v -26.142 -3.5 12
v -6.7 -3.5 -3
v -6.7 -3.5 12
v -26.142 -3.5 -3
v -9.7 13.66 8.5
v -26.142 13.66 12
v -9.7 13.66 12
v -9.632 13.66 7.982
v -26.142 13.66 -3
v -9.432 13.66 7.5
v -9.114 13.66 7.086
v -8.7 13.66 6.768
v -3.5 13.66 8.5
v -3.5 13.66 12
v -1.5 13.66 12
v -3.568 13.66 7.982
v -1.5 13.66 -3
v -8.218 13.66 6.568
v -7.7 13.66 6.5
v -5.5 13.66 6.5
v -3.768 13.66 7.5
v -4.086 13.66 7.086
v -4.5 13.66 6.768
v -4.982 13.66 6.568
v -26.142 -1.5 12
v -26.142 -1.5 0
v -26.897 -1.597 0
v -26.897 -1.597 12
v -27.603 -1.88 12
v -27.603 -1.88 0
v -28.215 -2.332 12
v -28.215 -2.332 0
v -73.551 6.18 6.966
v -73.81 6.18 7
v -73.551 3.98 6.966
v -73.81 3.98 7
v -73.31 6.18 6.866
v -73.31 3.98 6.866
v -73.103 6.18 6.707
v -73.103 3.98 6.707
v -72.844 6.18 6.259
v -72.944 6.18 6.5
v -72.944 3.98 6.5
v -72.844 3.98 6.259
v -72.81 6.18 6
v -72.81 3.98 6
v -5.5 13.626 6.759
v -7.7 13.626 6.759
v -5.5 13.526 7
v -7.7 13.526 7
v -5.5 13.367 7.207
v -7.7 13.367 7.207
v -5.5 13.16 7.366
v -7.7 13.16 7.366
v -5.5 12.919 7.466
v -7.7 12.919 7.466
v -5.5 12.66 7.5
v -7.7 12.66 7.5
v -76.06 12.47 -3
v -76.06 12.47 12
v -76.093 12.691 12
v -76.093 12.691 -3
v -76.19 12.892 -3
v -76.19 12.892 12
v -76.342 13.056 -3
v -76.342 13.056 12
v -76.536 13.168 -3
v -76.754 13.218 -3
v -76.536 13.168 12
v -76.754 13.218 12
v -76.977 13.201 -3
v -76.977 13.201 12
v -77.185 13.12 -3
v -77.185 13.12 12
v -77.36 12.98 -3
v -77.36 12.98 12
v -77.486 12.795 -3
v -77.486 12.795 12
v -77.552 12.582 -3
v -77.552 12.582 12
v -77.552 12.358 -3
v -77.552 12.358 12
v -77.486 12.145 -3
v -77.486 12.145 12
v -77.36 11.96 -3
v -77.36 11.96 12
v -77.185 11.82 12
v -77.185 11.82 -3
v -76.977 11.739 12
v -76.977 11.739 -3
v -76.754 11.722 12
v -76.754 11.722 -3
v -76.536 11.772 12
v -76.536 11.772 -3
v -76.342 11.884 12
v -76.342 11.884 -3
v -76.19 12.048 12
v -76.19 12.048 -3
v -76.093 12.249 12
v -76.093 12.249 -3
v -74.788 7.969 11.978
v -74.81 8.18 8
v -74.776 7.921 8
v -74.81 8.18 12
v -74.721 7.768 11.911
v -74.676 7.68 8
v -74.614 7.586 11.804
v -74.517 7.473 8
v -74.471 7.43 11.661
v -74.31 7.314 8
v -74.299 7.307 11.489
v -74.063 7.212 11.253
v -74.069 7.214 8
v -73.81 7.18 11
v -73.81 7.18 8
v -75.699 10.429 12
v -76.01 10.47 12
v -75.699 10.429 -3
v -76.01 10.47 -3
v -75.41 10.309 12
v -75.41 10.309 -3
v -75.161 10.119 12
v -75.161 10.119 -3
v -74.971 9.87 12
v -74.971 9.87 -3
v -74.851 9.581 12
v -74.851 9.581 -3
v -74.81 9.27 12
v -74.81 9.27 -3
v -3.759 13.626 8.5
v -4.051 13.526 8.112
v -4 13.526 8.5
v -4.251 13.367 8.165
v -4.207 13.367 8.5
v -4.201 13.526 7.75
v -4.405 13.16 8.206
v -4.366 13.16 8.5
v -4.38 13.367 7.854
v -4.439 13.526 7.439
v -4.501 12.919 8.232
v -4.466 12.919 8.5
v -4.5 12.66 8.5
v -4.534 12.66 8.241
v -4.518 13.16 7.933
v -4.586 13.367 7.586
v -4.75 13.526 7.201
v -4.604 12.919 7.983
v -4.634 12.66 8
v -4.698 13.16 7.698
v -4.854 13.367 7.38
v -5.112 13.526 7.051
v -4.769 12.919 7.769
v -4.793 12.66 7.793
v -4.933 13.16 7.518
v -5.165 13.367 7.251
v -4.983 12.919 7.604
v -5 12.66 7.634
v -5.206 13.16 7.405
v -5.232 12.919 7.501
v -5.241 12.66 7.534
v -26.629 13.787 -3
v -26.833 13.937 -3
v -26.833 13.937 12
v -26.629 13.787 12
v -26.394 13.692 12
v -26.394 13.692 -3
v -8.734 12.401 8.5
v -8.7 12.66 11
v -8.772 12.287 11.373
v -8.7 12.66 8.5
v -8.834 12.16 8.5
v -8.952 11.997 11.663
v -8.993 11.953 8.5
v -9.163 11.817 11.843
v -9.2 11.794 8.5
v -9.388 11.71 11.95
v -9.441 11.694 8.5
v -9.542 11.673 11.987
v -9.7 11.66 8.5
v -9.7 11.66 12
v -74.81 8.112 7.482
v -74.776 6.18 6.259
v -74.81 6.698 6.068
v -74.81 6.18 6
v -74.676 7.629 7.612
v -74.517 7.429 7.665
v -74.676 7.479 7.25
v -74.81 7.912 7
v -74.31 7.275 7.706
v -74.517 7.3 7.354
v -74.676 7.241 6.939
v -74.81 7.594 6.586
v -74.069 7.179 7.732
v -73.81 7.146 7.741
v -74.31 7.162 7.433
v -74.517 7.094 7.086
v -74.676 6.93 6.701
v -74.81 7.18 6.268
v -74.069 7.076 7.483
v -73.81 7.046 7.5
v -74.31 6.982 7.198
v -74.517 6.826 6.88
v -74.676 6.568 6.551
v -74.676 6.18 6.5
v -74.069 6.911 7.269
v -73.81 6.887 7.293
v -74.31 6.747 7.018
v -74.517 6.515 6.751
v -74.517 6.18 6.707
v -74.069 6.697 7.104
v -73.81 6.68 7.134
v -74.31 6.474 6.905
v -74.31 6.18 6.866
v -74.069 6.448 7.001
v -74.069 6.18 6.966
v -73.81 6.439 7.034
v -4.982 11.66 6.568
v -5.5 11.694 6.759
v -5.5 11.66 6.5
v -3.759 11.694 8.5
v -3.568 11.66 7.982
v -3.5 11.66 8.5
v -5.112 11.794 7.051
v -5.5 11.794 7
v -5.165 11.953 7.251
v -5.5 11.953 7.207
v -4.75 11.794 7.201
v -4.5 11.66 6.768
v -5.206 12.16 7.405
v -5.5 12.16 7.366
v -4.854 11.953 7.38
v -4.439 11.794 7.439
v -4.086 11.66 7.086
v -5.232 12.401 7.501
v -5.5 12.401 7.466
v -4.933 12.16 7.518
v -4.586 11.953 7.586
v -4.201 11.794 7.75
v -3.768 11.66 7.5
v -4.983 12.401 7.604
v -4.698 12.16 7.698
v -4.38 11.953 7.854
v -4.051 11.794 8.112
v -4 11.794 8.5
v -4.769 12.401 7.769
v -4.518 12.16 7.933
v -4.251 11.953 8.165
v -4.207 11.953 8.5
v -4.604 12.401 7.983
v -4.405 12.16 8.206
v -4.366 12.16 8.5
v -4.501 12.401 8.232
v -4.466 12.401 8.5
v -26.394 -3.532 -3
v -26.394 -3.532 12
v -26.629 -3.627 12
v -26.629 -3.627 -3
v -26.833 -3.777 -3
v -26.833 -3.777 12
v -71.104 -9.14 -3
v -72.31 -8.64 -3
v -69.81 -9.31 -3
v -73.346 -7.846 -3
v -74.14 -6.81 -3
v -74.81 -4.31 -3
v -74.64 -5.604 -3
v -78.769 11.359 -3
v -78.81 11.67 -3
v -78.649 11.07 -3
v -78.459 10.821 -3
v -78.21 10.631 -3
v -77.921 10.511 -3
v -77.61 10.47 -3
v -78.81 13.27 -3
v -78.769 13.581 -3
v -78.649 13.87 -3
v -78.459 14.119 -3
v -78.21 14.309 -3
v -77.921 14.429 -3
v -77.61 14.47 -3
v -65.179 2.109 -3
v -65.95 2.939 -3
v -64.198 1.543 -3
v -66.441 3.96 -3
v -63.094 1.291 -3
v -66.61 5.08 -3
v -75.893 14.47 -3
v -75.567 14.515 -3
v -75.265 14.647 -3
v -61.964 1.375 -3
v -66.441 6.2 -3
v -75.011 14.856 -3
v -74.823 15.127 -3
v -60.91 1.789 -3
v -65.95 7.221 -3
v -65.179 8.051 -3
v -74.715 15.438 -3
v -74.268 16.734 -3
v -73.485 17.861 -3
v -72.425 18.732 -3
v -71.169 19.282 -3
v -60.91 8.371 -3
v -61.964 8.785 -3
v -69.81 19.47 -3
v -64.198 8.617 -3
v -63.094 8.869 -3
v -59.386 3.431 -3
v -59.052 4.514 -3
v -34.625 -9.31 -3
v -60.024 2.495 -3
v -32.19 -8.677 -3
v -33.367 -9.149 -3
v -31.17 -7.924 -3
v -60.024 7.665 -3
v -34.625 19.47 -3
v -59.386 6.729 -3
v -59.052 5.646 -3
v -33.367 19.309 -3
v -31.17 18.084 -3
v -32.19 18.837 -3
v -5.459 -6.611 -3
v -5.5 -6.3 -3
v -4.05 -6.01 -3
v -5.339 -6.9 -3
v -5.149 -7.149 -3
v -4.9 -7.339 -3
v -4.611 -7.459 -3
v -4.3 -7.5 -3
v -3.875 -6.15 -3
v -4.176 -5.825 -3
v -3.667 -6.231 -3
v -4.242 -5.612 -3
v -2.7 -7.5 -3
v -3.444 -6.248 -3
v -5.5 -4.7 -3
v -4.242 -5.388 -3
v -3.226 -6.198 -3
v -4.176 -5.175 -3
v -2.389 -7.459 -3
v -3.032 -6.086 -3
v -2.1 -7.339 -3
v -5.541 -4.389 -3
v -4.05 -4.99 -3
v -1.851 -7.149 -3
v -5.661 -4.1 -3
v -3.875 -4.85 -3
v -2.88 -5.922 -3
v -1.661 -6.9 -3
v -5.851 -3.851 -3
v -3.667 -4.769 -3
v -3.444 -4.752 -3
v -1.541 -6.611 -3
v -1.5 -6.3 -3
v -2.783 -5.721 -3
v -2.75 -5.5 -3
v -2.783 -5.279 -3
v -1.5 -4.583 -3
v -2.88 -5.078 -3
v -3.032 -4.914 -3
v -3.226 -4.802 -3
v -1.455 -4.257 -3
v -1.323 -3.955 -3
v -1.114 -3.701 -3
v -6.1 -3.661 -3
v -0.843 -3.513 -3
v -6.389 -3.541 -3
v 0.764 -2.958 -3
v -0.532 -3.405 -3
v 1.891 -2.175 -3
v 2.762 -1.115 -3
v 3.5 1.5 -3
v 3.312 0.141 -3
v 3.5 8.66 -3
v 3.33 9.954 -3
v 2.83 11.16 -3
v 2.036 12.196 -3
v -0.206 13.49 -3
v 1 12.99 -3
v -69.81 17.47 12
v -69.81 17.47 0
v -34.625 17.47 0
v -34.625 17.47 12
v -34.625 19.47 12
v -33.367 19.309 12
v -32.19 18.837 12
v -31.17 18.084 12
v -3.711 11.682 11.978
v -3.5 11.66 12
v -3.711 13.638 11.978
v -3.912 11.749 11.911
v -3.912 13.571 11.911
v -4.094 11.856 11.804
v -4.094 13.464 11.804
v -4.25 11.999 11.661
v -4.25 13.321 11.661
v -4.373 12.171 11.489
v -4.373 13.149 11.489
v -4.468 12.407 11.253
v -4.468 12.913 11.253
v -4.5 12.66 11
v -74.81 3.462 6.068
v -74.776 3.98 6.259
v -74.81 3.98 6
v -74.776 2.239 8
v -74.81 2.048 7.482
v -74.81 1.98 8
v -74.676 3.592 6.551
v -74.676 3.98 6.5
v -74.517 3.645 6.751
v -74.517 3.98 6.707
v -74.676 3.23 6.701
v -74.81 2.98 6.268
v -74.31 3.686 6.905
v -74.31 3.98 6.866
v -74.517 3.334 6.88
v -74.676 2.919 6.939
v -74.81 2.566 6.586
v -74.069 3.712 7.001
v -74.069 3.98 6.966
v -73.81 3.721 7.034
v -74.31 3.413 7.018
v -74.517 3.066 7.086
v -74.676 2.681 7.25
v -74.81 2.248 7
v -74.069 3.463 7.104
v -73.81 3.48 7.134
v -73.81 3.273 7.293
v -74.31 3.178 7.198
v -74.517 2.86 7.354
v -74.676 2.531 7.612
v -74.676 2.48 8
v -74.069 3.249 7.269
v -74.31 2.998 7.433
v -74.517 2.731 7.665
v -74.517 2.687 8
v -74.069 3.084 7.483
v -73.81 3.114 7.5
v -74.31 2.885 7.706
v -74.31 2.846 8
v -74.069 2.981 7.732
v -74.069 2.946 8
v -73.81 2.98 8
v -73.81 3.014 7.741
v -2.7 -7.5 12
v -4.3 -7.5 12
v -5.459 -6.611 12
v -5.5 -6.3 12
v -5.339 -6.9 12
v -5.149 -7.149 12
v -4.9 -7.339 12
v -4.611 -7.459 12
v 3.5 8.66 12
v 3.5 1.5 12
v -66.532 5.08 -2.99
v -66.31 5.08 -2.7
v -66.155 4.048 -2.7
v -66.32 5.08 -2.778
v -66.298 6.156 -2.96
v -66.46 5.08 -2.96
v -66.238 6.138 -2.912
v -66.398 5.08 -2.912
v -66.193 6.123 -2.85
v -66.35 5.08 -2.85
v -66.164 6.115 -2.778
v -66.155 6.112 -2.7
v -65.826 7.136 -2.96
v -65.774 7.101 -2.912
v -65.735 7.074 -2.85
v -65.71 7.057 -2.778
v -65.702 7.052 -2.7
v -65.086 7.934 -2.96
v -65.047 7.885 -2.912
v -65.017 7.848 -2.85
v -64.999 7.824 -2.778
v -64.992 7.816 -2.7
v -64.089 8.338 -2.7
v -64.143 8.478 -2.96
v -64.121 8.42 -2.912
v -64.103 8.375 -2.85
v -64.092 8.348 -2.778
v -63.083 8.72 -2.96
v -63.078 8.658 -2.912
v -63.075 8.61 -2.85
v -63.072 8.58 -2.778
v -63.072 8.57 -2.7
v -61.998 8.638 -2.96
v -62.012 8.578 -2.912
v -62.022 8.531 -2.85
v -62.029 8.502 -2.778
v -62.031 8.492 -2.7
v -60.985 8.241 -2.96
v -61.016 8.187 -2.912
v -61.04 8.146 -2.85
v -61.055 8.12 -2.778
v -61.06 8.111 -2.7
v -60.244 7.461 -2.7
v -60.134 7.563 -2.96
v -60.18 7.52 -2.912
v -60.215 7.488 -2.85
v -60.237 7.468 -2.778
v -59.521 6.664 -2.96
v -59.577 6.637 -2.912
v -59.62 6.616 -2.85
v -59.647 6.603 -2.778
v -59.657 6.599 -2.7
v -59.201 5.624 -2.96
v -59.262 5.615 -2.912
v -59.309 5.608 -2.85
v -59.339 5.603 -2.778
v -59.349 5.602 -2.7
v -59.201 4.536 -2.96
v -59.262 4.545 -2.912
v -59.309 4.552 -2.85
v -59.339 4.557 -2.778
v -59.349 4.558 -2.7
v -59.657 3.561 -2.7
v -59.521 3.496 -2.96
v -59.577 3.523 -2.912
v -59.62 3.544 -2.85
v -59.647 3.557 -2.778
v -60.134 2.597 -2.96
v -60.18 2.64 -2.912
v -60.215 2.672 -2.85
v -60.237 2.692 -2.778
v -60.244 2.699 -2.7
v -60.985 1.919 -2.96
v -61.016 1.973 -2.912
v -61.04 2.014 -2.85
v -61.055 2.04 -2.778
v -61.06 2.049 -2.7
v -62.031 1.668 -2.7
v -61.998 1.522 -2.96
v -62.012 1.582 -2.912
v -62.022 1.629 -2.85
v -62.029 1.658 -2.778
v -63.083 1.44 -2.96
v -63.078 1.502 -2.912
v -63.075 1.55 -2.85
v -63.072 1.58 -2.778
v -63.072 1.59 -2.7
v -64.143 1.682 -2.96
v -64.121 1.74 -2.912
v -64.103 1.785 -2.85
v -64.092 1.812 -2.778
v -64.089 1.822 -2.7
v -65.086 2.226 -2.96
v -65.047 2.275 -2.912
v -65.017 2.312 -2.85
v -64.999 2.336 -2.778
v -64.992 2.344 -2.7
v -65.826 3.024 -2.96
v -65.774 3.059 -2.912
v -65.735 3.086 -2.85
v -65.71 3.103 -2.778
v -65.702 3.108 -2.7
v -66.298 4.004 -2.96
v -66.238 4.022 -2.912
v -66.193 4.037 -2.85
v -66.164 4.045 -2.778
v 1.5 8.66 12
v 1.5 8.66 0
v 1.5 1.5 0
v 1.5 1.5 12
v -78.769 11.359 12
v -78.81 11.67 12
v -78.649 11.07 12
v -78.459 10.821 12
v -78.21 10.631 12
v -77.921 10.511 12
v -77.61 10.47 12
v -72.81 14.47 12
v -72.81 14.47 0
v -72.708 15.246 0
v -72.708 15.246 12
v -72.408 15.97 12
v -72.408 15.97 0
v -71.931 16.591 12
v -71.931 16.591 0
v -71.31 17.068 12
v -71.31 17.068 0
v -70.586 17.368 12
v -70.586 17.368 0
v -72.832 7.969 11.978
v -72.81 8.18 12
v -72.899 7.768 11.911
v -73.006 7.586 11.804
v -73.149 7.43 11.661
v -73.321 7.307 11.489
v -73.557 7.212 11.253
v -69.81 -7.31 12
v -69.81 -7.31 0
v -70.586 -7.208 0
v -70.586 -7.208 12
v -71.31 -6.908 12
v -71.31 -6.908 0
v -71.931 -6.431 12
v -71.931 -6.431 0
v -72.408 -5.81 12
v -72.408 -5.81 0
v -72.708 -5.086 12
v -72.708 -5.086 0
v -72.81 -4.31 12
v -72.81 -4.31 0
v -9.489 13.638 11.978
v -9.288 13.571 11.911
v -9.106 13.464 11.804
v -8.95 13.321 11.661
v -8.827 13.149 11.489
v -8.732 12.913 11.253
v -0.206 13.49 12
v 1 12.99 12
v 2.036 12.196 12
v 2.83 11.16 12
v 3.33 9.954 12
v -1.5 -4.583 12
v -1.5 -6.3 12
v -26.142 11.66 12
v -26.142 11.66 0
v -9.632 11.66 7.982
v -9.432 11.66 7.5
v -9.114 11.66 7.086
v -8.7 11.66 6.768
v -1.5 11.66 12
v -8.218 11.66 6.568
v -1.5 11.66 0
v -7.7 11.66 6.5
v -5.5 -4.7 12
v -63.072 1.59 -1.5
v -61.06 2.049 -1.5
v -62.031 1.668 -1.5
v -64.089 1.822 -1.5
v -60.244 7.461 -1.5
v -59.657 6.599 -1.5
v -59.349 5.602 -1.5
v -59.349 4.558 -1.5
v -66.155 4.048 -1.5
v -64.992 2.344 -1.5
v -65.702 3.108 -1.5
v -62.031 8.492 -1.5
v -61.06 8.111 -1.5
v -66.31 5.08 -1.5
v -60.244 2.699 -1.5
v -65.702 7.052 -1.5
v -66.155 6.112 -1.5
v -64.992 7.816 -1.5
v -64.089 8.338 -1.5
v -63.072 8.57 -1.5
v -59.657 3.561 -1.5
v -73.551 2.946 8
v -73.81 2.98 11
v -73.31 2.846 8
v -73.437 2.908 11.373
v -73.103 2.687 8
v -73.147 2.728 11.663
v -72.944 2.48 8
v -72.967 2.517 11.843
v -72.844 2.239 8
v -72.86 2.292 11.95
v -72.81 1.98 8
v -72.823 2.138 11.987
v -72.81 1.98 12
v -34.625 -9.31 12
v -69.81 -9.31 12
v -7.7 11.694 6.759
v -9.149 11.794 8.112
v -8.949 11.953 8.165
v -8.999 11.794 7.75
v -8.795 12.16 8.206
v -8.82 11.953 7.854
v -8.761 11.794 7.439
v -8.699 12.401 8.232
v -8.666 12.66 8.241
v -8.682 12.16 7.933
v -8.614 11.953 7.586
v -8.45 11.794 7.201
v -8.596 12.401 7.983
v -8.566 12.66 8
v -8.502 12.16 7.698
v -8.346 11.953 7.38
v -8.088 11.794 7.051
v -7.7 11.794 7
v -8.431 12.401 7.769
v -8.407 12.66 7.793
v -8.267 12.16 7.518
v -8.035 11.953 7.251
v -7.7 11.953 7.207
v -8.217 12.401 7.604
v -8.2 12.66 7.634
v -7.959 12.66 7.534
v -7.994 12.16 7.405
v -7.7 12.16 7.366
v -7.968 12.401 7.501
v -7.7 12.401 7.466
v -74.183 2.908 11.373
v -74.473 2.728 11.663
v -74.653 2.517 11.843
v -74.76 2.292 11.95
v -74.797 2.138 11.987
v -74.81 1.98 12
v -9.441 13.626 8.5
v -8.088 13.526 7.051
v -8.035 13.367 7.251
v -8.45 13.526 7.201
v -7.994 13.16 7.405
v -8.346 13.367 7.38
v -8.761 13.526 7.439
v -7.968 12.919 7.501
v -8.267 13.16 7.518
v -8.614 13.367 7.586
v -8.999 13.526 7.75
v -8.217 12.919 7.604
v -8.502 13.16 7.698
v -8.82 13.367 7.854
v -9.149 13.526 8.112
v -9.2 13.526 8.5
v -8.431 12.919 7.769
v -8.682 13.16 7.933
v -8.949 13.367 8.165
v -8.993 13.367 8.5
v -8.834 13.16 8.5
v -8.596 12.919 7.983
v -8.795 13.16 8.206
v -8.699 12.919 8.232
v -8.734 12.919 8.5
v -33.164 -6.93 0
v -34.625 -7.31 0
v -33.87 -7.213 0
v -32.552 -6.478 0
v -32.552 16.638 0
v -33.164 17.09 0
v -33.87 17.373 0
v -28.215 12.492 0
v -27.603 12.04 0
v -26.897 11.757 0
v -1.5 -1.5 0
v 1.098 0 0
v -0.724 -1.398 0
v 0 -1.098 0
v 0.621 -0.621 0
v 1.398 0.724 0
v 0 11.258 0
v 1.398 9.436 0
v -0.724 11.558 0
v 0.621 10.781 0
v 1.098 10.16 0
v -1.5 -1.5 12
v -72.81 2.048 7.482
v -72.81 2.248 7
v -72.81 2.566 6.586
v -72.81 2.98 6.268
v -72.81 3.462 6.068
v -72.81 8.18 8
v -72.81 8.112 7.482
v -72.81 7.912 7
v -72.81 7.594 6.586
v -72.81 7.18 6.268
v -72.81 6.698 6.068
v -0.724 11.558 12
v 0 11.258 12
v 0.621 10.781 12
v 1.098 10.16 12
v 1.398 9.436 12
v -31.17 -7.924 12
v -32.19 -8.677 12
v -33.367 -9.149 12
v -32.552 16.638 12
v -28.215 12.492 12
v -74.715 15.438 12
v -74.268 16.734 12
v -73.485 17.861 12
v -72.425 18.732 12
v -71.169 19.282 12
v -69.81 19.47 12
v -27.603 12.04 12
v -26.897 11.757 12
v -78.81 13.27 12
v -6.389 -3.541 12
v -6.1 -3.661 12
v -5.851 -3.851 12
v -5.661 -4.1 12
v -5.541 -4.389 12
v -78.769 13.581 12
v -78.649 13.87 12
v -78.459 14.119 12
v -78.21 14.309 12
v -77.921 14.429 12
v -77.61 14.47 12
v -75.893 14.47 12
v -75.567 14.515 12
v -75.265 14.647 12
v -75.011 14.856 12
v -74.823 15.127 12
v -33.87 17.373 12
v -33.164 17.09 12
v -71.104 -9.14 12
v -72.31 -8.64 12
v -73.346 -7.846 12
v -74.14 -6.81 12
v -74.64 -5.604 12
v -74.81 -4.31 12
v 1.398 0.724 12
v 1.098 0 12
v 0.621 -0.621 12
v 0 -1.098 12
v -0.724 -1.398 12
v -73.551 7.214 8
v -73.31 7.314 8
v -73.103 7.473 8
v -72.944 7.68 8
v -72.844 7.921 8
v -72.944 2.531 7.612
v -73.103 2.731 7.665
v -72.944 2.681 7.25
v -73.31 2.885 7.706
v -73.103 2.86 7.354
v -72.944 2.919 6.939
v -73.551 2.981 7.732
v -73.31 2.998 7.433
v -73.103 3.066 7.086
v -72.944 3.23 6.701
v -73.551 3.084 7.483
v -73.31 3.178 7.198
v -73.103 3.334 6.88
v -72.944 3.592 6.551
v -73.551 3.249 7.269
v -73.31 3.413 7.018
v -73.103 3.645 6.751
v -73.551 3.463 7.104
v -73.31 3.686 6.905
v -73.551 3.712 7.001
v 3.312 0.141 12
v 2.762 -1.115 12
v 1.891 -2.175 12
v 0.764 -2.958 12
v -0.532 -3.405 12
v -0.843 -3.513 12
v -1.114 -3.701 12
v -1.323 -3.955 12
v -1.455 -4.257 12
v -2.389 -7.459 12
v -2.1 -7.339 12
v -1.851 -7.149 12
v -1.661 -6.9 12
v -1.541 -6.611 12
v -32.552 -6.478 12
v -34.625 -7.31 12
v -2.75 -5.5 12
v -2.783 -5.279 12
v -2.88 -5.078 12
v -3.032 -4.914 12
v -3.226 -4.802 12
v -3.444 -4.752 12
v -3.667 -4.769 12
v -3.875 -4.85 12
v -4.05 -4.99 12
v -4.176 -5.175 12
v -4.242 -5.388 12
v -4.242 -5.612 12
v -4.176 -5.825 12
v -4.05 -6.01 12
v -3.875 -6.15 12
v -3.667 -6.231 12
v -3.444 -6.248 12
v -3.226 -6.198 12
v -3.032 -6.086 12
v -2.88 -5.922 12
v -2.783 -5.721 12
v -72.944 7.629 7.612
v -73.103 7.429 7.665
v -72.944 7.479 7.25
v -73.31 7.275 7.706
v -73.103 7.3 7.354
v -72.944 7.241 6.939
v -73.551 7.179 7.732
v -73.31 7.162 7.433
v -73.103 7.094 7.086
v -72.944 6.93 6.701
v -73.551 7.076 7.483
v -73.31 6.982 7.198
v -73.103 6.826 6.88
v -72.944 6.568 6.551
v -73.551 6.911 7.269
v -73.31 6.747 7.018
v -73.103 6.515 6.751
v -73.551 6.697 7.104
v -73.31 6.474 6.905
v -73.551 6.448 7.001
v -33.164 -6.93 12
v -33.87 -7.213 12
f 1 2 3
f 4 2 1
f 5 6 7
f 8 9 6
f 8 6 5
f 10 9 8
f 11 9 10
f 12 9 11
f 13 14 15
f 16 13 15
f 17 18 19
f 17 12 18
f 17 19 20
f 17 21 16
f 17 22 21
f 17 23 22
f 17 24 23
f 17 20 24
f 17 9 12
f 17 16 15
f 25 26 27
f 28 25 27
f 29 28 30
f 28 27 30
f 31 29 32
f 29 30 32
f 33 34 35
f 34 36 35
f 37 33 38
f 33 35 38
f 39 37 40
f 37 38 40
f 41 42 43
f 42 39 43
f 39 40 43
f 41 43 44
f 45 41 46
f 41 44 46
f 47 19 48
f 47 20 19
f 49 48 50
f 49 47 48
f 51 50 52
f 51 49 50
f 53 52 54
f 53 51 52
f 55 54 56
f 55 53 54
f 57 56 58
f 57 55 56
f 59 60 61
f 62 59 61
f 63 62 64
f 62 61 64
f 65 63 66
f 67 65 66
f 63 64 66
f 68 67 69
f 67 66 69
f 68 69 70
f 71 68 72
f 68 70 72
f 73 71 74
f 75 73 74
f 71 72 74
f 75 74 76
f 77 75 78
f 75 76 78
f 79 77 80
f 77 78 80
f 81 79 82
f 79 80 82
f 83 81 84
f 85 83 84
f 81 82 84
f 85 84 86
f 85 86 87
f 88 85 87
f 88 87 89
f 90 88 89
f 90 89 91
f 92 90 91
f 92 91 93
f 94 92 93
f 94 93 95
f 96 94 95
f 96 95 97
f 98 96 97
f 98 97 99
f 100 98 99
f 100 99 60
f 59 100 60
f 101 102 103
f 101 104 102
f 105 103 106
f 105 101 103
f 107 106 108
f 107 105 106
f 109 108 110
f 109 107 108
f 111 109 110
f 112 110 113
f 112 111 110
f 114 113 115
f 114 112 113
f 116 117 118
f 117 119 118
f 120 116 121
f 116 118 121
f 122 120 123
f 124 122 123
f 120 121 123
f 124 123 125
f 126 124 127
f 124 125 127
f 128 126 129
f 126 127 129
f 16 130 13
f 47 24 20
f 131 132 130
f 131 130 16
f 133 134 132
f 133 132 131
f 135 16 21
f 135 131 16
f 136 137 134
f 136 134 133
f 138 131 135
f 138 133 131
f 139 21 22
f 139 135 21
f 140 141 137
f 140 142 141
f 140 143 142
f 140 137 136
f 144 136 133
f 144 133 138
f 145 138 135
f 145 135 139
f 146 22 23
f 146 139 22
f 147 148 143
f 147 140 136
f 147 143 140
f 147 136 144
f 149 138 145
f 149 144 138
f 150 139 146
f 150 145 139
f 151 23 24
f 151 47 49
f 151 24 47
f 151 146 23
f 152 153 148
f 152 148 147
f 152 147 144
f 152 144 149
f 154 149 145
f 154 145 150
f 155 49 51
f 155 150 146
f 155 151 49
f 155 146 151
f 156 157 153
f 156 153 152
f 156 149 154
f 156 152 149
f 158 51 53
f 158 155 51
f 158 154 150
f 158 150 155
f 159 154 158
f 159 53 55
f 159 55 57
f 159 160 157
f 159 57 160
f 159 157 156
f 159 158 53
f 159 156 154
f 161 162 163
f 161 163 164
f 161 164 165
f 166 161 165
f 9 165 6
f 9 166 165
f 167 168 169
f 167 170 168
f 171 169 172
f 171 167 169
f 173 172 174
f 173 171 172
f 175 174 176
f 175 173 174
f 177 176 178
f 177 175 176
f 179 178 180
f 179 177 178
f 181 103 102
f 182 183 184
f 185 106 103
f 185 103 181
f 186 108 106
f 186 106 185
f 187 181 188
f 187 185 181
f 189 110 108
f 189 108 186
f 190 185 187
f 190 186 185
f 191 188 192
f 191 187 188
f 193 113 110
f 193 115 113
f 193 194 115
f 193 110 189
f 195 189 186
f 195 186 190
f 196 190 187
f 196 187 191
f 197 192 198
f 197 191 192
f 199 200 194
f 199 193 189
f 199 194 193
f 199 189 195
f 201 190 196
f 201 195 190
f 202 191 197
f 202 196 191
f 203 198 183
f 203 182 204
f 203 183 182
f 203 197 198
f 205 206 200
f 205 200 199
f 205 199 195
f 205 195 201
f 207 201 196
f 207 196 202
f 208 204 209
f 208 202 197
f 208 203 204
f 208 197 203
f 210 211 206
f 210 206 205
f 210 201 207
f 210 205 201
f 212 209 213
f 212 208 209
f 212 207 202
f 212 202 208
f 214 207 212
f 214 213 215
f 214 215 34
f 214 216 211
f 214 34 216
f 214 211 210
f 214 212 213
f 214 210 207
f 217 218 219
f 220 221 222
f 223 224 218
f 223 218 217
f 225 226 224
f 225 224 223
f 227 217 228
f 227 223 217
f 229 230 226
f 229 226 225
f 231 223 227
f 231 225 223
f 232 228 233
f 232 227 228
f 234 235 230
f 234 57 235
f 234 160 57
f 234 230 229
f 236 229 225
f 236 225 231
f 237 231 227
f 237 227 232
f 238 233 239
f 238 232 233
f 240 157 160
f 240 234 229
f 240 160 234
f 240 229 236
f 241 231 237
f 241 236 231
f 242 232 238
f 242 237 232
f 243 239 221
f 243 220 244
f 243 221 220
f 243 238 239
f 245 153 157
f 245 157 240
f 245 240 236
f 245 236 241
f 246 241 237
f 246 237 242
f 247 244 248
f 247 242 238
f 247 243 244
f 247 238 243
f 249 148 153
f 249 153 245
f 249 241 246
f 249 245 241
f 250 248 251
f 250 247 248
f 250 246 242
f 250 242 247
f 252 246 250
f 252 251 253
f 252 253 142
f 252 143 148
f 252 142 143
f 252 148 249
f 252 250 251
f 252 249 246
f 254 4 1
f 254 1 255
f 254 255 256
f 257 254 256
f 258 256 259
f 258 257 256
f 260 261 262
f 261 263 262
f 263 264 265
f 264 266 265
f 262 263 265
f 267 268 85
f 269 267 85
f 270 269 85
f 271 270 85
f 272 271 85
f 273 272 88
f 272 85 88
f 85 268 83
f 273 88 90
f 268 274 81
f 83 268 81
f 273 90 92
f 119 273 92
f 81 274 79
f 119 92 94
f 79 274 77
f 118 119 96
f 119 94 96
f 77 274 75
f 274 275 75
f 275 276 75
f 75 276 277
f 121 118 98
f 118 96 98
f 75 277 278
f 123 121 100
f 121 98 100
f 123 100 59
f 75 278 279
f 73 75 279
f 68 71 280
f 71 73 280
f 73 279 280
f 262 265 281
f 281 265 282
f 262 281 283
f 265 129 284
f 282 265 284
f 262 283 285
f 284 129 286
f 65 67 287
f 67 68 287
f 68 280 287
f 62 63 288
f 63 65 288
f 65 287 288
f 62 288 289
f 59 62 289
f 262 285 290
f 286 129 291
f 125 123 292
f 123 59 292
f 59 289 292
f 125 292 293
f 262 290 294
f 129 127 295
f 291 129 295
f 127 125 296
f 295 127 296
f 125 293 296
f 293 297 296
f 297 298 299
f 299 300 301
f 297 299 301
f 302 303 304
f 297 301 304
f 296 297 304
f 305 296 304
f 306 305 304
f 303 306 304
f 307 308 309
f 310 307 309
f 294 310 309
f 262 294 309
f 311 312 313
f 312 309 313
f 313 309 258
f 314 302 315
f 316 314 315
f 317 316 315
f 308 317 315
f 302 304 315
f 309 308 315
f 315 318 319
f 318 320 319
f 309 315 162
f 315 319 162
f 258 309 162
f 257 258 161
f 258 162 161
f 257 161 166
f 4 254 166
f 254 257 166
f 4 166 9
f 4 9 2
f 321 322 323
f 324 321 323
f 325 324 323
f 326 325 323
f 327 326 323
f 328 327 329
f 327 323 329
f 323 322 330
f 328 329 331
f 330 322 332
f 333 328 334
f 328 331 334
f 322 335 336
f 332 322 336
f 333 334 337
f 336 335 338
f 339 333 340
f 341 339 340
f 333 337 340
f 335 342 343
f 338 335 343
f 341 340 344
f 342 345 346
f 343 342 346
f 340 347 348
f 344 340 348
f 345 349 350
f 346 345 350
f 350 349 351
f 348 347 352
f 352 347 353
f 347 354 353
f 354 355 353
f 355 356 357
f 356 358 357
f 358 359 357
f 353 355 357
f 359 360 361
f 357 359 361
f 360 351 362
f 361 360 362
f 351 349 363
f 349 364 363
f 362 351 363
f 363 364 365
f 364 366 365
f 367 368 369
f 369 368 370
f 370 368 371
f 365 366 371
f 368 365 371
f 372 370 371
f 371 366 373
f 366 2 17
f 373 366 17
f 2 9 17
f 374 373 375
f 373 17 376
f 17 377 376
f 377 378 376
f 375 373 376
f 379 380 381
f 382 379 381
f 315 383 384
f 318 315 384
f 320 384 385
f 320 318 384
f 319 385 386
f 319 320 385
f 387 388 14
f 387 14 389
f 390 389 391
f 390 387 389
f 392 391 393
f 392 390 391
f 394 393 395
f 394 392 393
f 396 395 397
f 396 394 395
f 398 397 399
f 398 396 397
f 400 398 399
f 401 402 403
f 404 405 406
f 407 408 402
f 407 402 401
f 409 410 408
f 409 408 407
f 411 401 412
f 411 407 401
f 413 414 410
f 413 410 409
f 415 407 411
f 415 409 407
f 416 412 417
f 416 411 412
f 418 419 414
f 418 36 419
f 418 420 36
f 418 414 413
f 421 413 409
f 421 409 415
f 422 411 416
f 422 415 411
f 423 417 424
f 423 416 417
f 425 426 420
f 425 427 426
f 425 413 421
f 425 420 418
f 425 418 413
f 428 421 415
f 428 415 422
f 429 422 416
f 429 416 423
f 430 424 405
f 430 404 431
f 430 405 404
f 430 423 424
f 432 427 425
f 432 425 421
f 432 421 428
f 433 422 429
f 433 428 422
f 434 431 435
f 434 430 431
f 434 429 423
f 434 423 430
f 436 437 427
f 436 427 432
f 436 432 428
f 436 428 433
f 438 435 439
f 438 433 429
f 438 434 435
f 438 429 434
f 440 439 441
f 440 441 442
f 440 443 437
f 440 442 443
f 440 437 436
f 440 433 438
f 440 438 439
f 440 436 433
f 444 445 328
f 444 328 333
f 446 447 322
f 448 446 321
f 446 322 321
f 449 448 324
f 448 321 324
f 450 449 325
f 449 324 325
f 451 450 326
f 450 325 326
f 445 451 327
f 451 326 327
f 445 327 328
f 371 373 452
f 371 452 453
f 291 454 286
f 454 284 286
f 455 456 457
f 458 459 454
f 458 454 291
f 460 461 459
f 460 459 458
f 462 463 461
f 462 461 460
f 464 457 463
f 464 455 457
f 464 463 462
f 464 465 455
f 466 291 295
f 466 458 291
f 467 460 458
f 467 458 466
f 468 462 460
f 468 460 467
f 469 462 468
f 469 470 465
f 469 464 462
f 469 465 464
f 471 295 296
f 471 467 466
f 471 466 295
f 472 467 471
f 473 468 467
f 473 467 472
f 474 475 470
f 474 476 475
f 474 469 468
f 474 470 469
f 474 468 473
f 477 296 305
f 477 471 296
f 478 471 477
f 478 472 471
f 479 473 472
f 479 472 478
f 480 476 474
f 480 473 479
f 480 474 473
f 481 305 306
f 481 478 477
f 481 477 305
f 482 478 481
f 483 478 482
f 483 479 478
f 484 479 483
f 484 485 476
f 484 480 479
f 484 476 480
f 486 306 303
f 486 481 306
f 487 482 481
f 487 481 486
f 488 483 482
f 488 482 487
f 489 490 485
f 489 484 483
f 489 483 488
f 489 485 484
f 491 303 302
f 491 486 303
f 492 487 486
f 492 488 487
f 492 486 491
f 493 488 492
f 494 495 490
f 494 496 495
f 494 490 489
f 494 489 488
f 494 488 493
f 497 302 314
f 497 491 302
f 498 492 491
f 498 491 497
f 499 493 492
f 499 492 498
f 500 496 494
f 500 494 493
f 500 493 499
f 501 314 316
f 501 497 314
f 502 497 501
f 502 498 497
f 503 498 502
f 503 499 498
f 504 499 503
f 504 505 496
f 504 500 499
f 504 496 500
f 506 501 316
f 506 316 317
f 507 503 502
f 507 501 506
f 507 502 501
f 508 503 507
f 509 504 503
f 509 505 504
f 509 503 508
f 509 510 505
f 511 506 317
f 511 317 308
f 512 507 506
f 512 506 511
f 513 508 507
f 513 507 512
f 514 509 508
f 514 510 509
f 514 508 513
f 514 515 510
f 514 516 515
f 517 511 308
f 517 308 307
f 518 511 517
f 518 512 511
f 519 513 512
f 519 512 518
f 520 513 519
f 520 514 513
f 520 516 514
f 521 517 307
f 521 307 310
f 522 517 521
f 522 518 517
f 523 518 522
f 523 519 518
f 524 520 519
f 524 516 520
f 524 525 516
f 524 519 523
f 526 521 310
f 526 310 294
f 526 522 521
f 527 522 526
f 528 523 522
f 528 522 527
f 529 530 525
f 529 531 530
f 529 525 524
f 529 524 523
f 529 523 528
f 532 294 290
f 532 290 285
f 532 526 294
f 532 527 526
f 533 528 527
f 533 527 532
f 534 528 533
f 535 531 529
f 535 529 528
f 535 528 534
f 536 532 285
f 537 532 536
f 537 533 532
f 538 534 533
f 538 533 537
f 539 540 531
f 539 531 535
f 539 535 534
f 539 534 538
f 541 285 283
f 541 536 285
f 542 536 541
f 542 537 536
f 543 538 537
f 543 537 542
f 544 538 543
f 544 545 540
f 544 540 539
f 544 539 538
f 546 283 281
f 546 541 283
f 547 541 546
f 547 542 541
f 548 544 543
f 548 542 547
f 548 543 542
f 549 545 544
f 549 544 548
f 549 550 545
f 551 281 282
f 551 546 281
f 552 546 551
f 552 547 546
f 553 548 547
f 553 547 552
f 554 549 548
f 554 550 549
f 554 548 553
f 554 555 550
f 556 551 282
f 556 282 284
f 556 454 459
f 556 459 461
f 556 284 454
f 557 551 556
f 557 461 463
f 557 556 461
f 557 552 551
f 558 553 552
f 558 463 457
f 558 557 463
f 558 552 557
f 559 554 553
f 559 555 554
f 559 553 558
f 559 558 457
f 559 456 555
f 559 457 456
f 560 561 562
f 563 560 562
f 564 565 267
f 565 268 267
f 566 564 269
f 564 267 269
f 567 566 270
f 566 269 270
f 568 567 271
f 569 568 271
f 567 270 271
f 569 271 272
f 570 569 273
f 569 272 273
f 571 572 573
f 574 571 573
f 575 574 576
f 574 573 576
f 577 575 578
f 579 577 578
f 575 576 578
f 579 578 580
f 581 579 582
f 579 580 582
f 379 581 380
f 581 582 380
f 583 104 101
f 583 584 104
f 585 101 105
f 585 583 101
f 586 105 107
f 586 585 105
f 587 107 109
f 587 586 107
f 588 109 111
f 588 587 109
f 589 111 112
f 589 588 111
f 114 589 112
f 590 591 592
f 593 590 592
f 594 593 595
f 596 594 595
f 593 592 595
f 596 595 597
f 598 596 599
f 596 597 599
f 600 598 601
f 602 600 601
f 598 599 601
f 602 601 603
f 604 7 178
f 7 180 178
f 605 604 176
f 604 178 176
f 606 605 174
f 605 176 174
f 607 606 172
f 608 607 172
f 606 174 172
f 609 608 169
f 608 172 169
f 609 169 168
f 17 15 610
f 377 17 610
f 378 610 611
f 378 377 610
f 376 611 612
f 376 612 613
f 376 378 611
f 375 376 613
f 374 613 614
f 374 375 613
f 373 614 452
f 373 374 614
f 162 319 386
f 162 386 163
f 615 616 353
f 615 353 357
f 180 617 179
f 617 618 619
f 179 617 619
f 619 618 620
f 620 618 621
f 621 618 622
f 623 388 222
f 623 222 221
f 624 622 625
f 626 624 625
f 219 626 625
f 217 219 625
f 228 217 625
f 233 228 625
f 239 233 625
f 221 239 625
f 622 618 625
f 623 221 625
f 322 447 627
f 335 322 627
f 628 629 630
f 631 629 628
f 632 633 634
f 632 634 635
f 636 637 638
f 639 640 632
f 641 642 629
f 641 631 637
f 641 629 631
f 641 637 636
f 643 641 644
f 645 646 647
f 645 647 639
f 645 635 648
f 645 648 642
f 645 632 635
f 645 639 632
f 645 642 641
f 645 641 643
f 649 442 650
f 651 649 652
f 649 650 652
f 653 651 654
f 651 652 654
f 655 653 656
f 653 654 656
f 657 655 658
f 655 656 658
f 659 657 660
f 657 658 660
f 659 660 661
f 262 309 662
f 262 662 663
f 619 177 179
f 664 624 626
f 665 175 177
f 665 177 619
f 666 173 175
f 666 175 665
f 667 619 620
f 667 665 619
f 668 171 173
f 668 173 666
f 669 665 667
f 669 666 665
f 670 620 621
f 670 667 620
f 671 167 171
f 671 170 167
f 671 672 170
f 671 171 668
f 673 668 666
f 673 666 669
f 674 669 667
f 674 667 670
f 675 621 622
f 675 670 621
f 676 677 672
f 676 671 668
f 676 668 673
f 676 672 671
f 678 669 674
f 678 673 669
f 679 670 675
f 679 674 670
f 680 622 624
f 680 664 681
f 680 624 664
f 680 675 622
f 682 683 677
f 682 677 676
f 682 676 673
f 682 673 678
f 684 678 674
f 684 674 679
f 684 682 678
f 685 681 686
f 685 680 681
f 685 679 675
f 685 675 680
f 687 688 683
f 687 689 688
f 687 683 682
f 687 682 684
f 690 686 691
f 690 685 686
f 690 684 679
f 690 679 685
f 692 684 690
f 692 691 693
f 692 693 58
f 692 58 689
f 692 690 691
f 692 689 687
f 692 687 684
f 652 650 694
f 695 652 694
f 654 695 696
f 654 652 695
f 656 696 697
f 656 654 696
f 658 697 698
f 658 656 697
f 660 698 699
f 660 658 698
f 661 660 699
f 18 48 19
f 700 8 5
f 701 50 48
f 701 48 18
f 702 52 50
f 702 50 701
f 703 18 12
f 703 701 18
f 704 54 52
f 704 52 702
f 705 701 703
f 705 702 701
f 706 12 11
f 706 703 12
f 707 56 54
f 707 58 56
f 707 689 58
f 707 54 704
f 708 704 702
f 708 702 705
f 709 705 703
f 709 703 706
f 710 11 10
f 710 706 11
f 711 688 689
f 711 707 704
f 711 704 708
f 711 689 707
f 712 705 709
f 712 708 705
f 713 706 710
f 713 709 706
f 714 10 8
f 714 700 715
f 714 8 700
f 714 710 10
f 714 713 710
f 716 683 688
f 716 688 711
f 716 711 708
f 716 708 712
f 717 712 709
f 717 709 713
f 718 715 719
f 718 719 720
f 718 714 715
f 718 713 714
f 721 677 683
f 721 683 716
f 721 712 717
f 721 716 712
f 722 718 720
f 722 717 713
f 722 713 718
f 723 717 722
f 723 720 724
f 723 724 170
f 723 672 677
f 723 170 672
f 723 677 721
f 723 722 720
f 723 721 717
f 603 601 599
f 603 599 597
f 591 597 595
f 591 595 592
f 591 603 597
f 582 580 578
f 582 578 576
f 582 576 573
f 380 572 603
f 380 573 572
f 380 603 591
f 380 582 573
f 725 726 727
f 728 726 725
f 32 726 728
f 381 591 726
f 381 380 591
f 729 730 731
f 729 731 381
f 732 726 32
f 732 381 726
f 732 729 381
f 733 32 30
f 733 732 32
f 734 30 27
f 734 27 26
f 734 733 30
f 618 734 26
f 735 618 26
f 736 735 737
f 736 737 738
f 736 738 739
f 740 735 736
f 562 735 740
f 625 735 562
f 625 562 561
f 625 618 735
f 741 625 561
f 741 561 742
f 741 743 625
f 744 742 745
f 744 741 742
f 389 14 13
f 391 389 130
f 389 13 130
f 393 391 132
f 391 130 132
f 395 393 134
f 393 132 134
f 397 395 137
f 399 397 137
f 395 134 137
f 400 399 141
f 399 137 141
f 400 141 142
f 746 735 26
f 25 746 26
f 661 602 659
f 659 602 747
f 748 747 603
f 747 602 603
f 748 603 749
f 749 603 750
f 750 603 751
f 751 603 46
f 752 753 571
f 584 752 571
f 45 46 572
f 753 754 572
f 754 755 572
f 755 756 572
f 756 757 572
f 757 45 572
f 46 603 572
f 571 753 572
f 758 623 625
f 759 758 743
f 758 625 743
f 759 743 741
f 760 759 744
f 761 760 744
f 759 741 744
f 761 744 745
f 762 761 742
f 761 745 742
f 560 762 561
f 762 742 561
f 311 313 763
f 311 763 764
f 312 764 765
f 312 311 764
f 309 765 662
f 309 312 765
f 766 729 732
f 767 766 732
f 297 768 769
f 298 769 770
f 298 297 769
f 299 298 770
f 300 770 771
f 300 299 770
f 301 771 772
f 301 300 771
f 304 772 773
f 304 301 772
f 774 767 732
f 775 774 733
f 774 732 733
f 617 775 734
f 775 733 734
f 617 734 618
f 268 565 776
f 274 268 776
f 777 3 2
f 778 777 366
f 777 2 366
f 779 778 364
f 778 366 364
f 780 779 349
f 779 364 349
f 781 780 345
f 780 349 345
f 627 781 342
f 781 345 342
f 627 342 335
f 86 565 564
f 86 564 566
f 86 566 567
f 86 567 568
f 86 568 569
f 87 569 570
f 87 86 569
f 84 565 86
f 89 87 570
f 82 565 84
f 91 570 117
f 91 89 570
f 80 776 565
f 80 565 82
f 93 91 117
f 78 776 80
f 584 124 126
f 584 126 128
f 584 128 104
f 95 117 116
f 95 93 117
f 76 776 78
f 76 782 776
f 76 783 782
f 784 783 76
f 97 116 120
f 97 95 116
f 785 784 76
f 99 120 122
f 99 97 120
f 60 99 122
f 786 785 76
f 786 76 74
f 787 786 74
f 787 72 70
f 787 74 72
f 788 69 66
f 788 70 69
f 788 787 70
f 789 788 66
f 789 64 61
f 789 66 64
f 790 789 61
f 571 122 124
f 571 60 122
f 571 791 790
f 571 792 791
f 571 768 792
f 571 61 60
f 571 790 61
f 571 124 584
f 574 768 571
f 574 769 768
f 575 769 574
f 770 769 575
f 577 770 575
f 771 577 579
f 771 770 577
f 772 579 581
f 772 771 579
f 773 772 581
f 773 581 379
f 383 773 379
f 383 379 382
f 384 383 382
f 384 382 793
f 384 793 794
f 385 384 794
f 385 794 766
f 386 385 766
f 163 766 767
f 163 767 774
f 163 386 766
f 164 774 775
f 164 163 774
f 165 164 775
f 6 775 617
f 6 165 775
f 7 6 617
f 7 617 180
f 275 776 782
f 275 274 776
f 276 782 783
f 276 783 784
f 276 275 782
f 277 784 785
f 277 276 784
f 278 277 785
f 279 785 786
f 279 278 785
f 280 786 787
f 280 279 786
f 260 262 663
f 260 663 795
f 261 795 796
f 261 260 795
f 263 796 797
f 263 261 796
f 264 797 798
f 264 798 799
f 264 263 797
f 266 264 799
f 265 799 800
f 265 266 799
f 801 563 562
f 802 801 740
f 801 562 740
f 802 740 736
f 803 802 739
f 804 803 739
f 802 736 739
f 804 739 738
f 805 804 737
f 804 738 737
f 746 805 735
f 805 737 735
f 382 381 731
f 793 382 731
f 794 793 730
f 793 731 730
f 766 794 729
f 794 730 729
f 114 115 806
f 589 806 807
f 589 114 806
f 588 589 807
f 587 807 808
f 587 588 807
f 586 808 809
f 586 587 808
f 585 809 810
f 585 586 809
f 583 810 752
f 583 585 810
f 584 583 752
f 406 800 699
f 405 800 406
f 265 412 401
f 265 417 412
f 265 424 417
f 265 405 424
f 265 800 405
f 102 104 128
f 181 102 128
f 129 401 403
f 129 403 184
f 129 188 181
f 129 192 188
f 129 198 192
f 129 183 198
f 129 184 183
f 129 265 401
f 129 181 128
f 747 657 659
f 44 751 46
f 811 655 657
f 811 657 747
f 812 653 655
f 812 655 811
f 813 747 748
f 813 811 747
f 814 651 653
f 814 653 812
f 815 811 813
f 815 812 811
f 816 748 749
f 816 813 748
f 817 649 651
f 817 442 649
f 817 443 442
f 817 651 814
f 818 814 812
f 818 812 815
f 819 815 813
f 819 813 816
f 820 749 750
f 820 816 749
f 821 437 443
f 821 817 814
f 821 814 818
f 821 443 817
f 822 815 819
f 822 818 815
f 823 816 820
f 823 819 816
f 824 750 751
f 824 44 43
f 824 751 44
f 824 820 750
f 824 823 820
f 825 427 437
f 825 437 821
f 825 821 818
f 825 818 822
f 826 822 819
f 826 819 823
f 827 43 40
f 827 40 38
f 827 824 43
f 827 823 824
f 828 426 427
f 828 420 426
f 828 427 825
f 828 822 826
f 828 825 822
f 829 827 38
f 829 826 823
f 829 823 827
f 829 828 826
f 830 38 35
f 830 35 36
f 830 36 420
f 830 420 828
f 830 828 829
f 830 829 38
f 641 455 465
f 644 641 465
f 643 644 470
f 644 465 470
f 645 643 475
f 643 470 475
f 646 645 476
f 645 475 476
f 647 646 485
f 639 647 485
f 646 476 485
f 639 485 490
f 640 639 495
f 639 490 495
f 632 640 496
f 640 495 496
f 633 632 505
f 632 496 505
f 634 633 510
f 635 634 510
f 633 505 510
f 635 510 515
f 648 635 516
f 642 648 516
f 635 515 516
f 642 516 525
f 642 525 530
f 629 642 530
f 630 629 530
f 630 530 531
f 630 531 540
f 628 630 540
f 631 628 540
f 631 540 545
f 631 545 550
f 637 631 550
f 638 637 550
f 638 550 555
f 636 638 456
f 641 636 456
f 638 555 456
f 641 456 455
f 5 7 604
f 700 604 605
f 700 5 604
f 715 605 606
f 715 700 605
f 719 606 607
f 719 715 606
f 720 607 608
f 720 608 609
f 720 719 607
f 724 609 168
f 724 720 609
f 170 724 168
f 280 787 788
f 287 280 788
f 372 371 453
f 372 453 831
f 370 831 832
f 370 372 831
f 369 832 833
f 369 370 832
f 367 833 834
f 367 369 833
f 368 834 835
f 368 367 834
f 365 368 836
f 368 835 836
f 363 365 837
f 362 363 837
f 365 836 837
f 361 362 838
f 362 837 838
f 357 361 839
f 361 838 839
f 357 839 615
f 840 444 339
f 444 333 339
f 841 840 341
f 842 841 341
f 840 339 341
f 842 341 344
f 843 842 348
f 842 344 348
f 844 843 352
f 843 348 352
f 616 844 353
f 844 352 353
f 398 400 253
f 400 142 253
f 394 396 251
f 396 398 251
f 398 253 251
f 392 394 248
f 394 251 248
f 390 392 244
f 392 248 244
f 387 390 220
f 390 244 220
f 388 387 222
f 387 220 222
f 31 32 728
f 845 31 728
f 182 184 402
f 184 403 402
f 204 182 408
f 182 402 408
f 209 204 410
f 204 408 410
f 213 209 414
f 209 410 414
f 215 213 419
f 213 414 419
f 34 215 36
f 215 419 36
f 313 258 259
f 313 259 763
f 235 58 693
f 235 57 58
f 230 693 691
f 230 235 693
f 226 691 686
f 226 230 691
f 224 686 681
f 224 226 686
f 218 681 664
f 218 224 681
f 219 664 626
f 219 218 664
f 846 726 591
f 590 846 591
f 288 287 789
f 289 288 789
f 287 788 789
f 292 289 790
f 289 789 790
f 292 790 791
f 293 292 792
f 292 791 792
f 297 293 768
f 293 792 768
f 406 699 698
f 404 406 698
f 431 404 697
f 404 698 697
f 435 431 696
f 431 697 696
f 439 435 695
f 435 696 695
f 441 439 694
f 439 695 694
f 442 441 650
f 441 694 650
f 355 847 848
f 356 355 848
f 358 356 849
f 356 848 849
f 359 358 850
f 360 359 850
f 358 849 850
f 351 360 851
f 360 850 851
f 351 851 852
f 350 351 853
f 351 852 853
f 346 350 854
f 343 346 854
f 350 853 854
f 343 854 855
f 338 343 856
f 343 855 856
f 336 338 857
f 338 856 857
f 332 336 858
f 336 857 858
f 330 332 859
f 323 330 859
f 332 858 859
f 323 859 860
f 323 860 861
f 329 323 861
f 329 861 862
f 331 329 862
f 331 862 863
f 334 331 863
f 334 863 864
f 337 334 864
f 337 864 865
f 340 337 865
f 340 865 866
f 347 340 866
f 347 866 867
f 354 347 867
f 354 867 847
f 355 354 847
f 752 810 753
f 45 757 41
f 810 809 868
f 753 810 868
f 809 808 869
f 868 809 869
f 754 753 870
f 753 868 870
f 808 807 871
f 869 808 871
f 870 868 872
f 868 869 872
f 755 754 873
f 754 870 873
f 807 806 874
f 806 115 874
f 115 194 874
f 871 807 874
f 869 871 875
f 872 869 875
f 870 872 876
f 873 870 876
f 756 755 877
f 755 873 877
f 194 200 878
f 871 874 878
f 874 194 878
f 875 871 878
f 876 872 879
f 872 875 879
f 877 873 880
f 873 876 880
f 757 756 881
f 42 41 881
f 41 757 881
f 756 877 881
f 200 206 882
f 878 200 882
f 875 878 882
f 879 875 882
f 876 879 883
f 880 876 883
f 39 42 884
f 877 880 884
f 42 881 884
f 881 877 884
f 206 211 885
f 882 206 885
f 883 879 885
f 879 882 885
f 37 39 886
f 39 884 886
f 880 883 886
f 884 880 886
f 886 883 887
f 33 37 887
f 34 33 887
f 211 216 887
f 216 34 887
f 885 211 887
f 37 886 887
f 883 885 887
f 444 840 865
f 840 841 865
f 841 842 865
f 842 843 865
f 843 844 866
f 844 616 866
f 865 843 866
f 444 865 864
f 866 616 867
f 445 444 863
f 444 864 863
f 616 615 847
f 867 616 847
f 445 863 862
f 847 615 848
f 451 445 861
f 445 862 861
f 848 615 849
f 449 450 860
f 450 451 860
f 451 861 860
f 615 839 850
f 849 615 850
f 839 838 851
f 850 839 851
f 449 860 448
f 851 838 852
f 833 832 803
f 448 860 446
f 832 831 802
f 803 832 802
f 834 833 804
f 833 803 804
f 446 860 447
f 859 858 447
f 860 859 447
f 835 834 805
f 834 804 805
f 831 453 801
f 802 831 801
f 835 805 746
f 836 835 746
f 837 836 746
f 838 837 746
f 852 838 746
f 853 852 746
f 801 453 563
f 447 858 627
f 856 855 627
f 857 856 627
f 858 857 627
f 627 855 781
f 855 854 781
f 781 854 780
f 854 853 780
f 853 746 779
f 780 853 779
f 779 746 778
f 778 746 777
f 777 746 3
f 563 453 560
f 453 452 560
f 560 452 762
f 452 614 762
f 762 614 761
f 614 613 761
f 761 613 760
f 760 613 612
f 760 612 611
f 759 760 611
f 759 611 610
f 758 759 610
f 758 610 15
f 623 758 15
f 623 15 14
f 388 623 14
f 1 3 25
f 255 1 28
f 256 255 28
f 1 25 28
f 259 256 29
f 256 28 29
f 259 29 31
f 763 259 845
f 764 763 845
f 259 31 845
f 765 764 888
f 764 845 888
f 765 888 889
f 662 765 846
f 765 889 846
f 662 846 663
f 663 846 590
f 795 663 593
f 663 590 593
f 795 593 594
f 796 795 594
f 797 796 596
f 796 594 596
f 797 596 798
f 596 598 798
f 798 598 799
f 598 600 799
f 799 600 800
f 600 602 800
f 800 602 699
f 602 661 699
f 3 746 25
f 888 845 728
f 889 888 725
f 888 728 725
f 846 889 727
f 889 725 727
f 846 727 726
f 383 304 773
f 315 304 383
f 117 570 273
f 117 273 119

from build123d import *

# Parameters (mm, degrees)
BOSS_EXTRUDE2_DEPTH      = 12
BOSS_EXTRUDE2_DEPTH_BACK = 3
BOSS_EXTRUDE3_DEPTH      = 3
SKETCH6_W                = 5
SKETCH6_H                = 2.1
CUT_EXTRUDE1_DEPTH       = 10
SKETCH7_W                = 4.2
SKETCH7_H                = 4.5
CUT_EXTRUDE2_DEPTH       = 10
FILLET1_R                = 1
SKETCH8_W                = 4
SKETCH8_H                = 4
BOSS_EXTRUDE4_DEPTH      = 15
FILLET2_R                = 1.2
SKETCH9_R                = 0.75
CUT_EXTRUDE3_DEPTH       = 83.553600769
SKETCH10_R               = 3.5
CUT_EXTRUDE4_DEPTH       = 1.5
FILLET3_R                = 0.3


with BuildPart() as part:
    # Sketch3 → Boss-Extrude2 (new, two sides: drawn at the far end of the back side and taken through both)
    with BuildSketch(Plane.XY.offset(-BOSS_EXTRUDE2_DEPTH_BACK)):
        with BuildLine():
            Line((-69.81, 19.47), (-34.625063383, 19.47))
            ThreePointArc((-34.625063383, 19.47), (-32.763487521, 19.110531791), (-31.169582594, 18.083814123))
            Line((-31.169582594, 18.083814123), (-26.833005647, 13.937237175))
            ThreePointArc((-26.833005647, 13.937237175), (-26.514224661, 13.731893642), (-26.141909489, 13.66))
            Line((-26.141909489, 13.66), (-1.5, 13.66))
            ThreePointArc((-1.5, 13.66), (2.035533906, 12.195533906), (3.5, 8.66))
            Line((3.5, 8.66), (3.5, 1.5))
            ThreePointArc((3.5, 1.5), (2.035533906, -2.035533906), (-1.5, -3.5))
            Line((-1.5, -3.5), (-26.141909489, -3.5))
            ThreePointArc((-26.141909489, -3.5), (-26.514224661, -3.571893642), (-26.833005647, -3.777237175))
            Line((-26.833005647, -3.777237175), (-31.169582594, -7.923814123))
            ThreePointArc((-31.169582594, -7.923814123), (-32.763487521, -8.950531791), (-34.625063383, -9.31))
            Line((-34.625063383, -9.31), (-69.81, -9.31))
            ThreePointArc((-69.81, -9.31), (-73.345533906, -7.845533906), (-74.81, -4.31))
            Line((-74.81, -4.31), (-74.81, 14.47))
            ThreePointArc((-74.81, 14.47), (-73.345533906, 18.005533906), (-69.81, 19.47))
        make_face()
        with BuildLine():
            Line((-69.81, 17.47), (-34.625063383, 17.47))
            ThreePointArc((-34.625063383, 17.47), (-33.508117866, 17.254319075), (-32.55177491, 16.638288474))
            Line((-32.55177491, 16.638288474), (-28.215197962, 12.491711526))
            ThreePointArc((-28.215197962, 12.491711526), (-27.258855006, 11.875680925), (-26.141909489, 11.66))
            Line((-26.141909489, 11.66), (-1.5, 11.66))
            ThreePointArc((-1.5, 11.66), (0.621320344, 10.781320344), (1.5, 8.66))
            Line((1.5, 8.66), (1.5, 1.5))
            ThreePointArc((1.5, 1.5), (0.621320344, -0.621320344), (-1.5, -1.5))
            Line((-1.5, -1.5), (-26.141909489, -1.5))
            ThreePointArc((-26.141909489, -1.5), (-27.258855006, -1.715680925), (-28.215197962, -2.331711526))
            Line((-28.215197962, -2.331711526), (-32.55177491, -6.478288474))
            ThreePointArc((-32.55177491, -6.478288474), (-33.508117866, -7.094319075), (-34.625063383, -7.31))
            Line((-34.625063383, -7.31), (-69.81, -7.31))
            ThreePointArc((-69.81, -7.31), (-71.931320344, -6.431320344), (-72.81, -4.31))
            Line((-72.81, -4.31), (-72.81, 14.47))
            ThreePointArc((-72.81, 14.47), (-71.931320344, 16.591320344), (-69.81, 17.47))
        make_face(mode=Mode.SUBTRACT)
    extrude(amount=BOSS_EXTRUDE2_DEPTH + BOSS_EXTRUDE2_DEPTH_BACK)

    # Sketch5 → Boss-Extrude3 (add)
    with BuildSketch(Plane(origin=(0, 0, -3), x_dir=(-1, 0, 0), z_dir=(0, 0, -1))):
        with BuildLine():
            Line((72.81, 14.47), (72.81, -4.31))
            ThreePointArc((72.81, -4.31), (71.931320344, -6.431320344), (69.81, -7.31))
            Line((69.81, -7.31), (34.625063383, -7.31))
            ThreePointArc((34.625063383, -7.31), (33.508117866, -7.094319075), (32.55177491, -6.478288474))
            Line((32.55177491, -6.478288474), (28.215197962, -2.331711526))
            ThreePointArc((28.215197962, -2.331711526), (27.258855006, -1.715680925), (26.141909489, -1.5))
            Line((26.141909489, -1.5), (1.5, -1.5))
            ThreePointArc((1.5, -1.5), (-0.621320344, -0.621320344), (-1.5, 1.5))
            Line((-1.5, 1.5), (-1.5, 8.66))
            ThreePointArc((-1.5, 8.66), (-0.621320344, 10.781320344), (1.5, 11.66))
            Line((1.5, 11.66), (26.141909489, 11.66))
            ThreePointArc((26.141909489, 11.66), (27.258855006, 11.875680925), (28.215197962, 12.491711526))
            Line((28.215197962, 12.491711526), (32.55177491, 16.638288474))
            ThreePointArc((32.55177491, 16.638288474), (33.508117866, 17.254319075), (34.625063383, 17.47))
            Line((34.625063383, 17.47), (69.81, 17.47))
            ThreePointArc((69.81, 17.47), (71.931320344, 16.591320344), (72.81, 14.47))
        make_face()
    extrude(amount=-BOSS_EXTRUDE3_DEPTH)

    # Sketch6 → Cut-Extrude1 (cut)
    with BuildSketch(Plane.ZY.offset(74.81)):
        with Locations((9.5, 6.13)):
            Rectangle(SKETCH6_W, SKETCH6_H)
        with Locations((9.5, 4.03)):
            Rectangle(SKETCH6_W, SKETCH6_H)
    extrude(amount=-CUT_EXTRUDE1_DEPTH, mode=Mode.SUBTRACT)

    # Sketch7 → Cut-Extrude2 (cut)
    with BuildSketch(Plane(origin=(0, 13.66, 0), x_dir=(1, 0, 0), z_dir=(0, 1, 0))):
        with Locations((-6.6, -9.75)):
            Rectangle(SKETCH7_W, SKETCH7_H)
    extrude(amount=-CUT_EXTRUDE2_DEPTH, mode=Mode.SUBTRACT)

    # Fillet1
    fillet1_edges = [part.edges().sort_by_distance(p)[0] for p in [
        (-73.81, 2.98, 12),
        (-73.81, 7.18, 12),
        (-72.81, 5.08, 7),
        (-73.81, 2.98, 7),
        (-73.81, 7.18, 7),
        (-74.81, 7.18, 9.5),
        (-72.81, 2.98, 9.5),
        (-72.81, 7.18, 9.5),
        (-74.81, 5.08, 7),
        (-74.81, 2.98, 9.5),
        (-4.5, 12.66, 12),
        (-8.7, 11.66, 9.75),
        (-8.7, 12.66, 12),
        (-6.6, 11.66, 7.5),
        (-8.7, 12.66, 7.5),
        (-4.5, 11.66, 9.75),
        (-4.5, 12.66, 7.5),
        (-4.5, 13.66, 9.75),
        (-6.6, 13.66, 7.5),
        (-8.7, 13.66, 9.75),
    ]]
    fillet(fillet1_edges, radius=FILLET1_R - 0.0001)  # a hair under: the kernel refuses the full size

    # Sketch8 → Boss-Extrude4 (add, through all)
    with BuildSketch(Plane.XY.offset(12)):
        with Locations((-76.81, 12.47)):
            Rectangle(SKETCH8_W, SKETCH8_H)
        with Locations((-3.5, -5.5)):
            Rectangle(SKETCH8_W, SKETCH8_H)
    extrude(amount=-BOSS_EXTRUDE4_DEPTH)

    # Fillet2
    fillet2_edges = [part.edges().sort_by_distance(p)[0] for p in [
        (-1.5, -3.5, 4.5),
        (-74.81, 14.47, 4.5),
        (-74.81, 10.47, 4.5),
        (-78.81, 10.47, 4.5),
        (-78.81, 14.47, 4.5),
        (-1.5, -7.5, 4.5),
        (-5.5, -7.5, 4.5),
        (-5.5, -3.5, 4.5),
    ]]
    fillet(fillet2_edges, radius=FILLET2_R)

    # Sketch9 → Cut-Extrude3 (cut, through all)
    with BuildSketch(Plane.XY.offset(12)):
        with Locations((-76.81, 12.47)):
            Circle(SKETCH9_R)
        with Locations((-3.5, -5.5)):
            Circle(SKETCH9_R)
    extrude(amount=-CUT_EXTRUDE3_DEPTH, mode=Mode.SUBTRACT)

    # Sketch10 → Cut-Extrude4 (cut)
    with BuildSketch(Plane(origin=(0, 0, -3), x_dir=(-1, 0, 0), z_dir=(0, 0, -1))):
        with Locations((62.81, 5.08)):
            Circle(SKETCH10_R)
    extrude(amount=-CUT_EXTRUDE4_DEPTH, mode=Mode.SUBTRACT)

    # Fillet3
    fillet3_edges = [part.edges().sort_by_distance(p)[0] for p in [
        (-59.31, 5.08, -3),
    ]]
    fillet(fillet3_edges, radius=FILLET3_R)


solid = part.part
